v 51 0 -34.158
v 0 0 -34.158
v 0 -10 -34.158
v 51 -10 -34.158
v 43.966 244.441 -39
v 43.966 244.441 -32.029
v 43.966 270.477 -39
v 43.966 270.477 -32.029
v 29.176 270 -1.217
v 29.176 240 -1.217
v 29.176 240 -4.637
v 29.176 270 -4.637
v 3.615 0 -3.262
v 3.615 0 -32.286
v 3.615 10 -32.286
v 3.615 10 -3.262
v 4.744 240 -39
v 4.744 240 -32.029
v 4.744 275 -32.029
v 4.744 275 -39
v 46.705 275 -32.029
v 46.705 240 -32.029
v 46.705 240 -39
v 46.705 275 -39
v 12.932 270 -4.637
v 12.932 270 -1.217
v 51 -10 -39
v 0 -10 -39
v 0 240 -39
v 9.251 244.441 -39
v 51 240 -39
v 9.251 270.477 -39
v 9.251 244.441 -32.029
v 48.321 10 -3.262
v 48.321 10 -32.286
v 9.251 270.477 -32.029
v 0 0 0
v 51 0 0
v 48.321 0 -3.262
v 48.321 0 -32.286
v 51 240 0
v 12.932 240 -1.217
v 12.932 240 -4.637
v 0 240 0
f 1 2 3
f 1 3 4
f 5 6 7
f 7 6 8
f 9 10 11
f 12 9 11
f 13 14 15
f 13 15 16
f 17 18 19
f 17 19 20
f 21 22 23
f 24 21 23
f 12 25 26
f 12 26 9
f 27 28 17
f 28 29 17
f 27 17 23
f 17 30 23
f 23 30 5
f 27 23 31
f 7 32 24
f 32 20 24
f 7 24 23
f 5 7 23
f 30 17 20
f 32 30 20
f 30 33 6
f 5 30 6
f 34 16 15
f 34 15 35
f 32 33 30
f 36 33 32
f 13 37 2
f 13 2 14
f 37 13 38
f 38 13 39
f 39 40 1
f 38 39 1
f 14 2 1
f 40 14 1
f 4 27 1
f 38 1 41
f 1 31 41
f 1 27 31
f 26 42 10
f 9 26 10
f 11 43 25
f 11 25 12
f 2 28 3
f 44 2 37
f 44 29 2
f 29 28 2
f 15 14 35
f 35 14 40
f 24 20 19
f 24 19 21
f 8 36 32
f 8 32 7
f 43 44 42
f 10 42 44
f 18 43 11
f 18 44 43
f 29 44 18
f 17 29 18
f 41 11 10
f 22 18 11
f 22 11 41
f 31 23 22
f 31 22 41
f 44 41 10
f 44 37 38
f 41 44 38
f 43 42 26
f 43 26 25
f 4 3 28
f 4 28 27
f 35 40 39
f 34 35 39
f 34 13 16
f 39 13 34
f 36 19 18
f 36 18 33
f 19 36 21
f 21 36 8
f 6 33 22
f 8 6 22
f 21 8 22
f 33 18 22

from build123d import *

# Parameters (mm, degrees)
SKETCH_1_W          = 51
SKETCH_1_H          = 39
EXTRUDE_1_DEPTH     = 240
SKETCH_2_W          = 41.961119827
SKETCH_2_H          = 6.971123129
EXTRUDE_2_DEPTH     = 35
SKETCH_3_W          = 16.244799638
SKETCH_3_H          = 3.419957818
EXTRUDE_3_DEPTH     = 30
SKETCH_4_W          = 51
SKETCH_4_H          = 4.841751688
EXTRUDE_4_DEPTH     = 10
SKETCH_5_W          = 44.706396848
SKETCH_5_H          = 29.024048215
CUT_EXTRUDE_1_DEPTH = 10
SKETCH_6_W          = 34.715500368
SKETCH_6_H          = 26.036625276
CUT_EXTRUDE_2_DEPTH = 10


with BuildPart() as part:
    # 草图1 → 凸台-拉伸1 (new body)
    with BuildSketch(Plane(origin=(0, 0, 0), x_dir=(1, 0, 0), z_dir=(0, 1, 0))):
        with Locations((25.5, 19.5)):
            Rectangle(SKETCH_1_W, SKETCH_1_H)
    extrude(amount=EXTRUDE_1_DEPTH)

    # 草图2 → 凸台-拉伸2 (add)
    with BuildSketch(Plane(origin=(0, 240, 0), x_dir=(1, 0, 0), z_dir=(0, 1, 0))):
        with Locations((25.724627293, 35.514438435)):
            Rectangle(SKETCH_2_W, SKETCH_2_H)
    extrude(amount=EXTRUDE_2_DEPTH)

    # 草图3 → 凸台-拉伸3 (add)
    with BuildSketch(Plane(origin=(0, 240, 0), x_dir=(1, 0, 0), z_dir=(0, 1, 0))):
        with Locations((21.054054836, 2.926937994)):
            Rectangle(SKETCH_3_W, SKETCH_3_H)
    extrude(amount=EXTRUDE_3_DEPTH)

    # 草图4 → 凸台-拉伸4 (add)
    with BuildSketch(Plane.XZ):
        with Locations((25.5, -36.579124156)):
            Rectangle(SKETCH_4_W, SKETCH_4_H)
    extrude(amount=EXTRUDE_4_DEPTH)

    # 草图5 → 切除-拉伸1 (cut)
    with BuildSketch(Plane.XZ):
        with Locations((25.96812981, -17.773771326)):
            Rectangle(SKETCH_5_W, SKETCH_5_H)
    extrude(amount=-CUT_EXTRUDE_1_DEPTH, mode=Mode.SUBTRACT)

    # 草图6 → 切除-拉伸2 (cut)
    with BuildSketch(Plane.XY.offset(-32.028876871)):
        with Locations((26.608486618, 257.459000656)):
            Rectangle(SKETCH_6_W, SKETCH_6_H)
    extrude(amount=-CUT_EXTRUDE_2_DEPTH, mode=Mode.SUBTRACT)


solid = part.part
